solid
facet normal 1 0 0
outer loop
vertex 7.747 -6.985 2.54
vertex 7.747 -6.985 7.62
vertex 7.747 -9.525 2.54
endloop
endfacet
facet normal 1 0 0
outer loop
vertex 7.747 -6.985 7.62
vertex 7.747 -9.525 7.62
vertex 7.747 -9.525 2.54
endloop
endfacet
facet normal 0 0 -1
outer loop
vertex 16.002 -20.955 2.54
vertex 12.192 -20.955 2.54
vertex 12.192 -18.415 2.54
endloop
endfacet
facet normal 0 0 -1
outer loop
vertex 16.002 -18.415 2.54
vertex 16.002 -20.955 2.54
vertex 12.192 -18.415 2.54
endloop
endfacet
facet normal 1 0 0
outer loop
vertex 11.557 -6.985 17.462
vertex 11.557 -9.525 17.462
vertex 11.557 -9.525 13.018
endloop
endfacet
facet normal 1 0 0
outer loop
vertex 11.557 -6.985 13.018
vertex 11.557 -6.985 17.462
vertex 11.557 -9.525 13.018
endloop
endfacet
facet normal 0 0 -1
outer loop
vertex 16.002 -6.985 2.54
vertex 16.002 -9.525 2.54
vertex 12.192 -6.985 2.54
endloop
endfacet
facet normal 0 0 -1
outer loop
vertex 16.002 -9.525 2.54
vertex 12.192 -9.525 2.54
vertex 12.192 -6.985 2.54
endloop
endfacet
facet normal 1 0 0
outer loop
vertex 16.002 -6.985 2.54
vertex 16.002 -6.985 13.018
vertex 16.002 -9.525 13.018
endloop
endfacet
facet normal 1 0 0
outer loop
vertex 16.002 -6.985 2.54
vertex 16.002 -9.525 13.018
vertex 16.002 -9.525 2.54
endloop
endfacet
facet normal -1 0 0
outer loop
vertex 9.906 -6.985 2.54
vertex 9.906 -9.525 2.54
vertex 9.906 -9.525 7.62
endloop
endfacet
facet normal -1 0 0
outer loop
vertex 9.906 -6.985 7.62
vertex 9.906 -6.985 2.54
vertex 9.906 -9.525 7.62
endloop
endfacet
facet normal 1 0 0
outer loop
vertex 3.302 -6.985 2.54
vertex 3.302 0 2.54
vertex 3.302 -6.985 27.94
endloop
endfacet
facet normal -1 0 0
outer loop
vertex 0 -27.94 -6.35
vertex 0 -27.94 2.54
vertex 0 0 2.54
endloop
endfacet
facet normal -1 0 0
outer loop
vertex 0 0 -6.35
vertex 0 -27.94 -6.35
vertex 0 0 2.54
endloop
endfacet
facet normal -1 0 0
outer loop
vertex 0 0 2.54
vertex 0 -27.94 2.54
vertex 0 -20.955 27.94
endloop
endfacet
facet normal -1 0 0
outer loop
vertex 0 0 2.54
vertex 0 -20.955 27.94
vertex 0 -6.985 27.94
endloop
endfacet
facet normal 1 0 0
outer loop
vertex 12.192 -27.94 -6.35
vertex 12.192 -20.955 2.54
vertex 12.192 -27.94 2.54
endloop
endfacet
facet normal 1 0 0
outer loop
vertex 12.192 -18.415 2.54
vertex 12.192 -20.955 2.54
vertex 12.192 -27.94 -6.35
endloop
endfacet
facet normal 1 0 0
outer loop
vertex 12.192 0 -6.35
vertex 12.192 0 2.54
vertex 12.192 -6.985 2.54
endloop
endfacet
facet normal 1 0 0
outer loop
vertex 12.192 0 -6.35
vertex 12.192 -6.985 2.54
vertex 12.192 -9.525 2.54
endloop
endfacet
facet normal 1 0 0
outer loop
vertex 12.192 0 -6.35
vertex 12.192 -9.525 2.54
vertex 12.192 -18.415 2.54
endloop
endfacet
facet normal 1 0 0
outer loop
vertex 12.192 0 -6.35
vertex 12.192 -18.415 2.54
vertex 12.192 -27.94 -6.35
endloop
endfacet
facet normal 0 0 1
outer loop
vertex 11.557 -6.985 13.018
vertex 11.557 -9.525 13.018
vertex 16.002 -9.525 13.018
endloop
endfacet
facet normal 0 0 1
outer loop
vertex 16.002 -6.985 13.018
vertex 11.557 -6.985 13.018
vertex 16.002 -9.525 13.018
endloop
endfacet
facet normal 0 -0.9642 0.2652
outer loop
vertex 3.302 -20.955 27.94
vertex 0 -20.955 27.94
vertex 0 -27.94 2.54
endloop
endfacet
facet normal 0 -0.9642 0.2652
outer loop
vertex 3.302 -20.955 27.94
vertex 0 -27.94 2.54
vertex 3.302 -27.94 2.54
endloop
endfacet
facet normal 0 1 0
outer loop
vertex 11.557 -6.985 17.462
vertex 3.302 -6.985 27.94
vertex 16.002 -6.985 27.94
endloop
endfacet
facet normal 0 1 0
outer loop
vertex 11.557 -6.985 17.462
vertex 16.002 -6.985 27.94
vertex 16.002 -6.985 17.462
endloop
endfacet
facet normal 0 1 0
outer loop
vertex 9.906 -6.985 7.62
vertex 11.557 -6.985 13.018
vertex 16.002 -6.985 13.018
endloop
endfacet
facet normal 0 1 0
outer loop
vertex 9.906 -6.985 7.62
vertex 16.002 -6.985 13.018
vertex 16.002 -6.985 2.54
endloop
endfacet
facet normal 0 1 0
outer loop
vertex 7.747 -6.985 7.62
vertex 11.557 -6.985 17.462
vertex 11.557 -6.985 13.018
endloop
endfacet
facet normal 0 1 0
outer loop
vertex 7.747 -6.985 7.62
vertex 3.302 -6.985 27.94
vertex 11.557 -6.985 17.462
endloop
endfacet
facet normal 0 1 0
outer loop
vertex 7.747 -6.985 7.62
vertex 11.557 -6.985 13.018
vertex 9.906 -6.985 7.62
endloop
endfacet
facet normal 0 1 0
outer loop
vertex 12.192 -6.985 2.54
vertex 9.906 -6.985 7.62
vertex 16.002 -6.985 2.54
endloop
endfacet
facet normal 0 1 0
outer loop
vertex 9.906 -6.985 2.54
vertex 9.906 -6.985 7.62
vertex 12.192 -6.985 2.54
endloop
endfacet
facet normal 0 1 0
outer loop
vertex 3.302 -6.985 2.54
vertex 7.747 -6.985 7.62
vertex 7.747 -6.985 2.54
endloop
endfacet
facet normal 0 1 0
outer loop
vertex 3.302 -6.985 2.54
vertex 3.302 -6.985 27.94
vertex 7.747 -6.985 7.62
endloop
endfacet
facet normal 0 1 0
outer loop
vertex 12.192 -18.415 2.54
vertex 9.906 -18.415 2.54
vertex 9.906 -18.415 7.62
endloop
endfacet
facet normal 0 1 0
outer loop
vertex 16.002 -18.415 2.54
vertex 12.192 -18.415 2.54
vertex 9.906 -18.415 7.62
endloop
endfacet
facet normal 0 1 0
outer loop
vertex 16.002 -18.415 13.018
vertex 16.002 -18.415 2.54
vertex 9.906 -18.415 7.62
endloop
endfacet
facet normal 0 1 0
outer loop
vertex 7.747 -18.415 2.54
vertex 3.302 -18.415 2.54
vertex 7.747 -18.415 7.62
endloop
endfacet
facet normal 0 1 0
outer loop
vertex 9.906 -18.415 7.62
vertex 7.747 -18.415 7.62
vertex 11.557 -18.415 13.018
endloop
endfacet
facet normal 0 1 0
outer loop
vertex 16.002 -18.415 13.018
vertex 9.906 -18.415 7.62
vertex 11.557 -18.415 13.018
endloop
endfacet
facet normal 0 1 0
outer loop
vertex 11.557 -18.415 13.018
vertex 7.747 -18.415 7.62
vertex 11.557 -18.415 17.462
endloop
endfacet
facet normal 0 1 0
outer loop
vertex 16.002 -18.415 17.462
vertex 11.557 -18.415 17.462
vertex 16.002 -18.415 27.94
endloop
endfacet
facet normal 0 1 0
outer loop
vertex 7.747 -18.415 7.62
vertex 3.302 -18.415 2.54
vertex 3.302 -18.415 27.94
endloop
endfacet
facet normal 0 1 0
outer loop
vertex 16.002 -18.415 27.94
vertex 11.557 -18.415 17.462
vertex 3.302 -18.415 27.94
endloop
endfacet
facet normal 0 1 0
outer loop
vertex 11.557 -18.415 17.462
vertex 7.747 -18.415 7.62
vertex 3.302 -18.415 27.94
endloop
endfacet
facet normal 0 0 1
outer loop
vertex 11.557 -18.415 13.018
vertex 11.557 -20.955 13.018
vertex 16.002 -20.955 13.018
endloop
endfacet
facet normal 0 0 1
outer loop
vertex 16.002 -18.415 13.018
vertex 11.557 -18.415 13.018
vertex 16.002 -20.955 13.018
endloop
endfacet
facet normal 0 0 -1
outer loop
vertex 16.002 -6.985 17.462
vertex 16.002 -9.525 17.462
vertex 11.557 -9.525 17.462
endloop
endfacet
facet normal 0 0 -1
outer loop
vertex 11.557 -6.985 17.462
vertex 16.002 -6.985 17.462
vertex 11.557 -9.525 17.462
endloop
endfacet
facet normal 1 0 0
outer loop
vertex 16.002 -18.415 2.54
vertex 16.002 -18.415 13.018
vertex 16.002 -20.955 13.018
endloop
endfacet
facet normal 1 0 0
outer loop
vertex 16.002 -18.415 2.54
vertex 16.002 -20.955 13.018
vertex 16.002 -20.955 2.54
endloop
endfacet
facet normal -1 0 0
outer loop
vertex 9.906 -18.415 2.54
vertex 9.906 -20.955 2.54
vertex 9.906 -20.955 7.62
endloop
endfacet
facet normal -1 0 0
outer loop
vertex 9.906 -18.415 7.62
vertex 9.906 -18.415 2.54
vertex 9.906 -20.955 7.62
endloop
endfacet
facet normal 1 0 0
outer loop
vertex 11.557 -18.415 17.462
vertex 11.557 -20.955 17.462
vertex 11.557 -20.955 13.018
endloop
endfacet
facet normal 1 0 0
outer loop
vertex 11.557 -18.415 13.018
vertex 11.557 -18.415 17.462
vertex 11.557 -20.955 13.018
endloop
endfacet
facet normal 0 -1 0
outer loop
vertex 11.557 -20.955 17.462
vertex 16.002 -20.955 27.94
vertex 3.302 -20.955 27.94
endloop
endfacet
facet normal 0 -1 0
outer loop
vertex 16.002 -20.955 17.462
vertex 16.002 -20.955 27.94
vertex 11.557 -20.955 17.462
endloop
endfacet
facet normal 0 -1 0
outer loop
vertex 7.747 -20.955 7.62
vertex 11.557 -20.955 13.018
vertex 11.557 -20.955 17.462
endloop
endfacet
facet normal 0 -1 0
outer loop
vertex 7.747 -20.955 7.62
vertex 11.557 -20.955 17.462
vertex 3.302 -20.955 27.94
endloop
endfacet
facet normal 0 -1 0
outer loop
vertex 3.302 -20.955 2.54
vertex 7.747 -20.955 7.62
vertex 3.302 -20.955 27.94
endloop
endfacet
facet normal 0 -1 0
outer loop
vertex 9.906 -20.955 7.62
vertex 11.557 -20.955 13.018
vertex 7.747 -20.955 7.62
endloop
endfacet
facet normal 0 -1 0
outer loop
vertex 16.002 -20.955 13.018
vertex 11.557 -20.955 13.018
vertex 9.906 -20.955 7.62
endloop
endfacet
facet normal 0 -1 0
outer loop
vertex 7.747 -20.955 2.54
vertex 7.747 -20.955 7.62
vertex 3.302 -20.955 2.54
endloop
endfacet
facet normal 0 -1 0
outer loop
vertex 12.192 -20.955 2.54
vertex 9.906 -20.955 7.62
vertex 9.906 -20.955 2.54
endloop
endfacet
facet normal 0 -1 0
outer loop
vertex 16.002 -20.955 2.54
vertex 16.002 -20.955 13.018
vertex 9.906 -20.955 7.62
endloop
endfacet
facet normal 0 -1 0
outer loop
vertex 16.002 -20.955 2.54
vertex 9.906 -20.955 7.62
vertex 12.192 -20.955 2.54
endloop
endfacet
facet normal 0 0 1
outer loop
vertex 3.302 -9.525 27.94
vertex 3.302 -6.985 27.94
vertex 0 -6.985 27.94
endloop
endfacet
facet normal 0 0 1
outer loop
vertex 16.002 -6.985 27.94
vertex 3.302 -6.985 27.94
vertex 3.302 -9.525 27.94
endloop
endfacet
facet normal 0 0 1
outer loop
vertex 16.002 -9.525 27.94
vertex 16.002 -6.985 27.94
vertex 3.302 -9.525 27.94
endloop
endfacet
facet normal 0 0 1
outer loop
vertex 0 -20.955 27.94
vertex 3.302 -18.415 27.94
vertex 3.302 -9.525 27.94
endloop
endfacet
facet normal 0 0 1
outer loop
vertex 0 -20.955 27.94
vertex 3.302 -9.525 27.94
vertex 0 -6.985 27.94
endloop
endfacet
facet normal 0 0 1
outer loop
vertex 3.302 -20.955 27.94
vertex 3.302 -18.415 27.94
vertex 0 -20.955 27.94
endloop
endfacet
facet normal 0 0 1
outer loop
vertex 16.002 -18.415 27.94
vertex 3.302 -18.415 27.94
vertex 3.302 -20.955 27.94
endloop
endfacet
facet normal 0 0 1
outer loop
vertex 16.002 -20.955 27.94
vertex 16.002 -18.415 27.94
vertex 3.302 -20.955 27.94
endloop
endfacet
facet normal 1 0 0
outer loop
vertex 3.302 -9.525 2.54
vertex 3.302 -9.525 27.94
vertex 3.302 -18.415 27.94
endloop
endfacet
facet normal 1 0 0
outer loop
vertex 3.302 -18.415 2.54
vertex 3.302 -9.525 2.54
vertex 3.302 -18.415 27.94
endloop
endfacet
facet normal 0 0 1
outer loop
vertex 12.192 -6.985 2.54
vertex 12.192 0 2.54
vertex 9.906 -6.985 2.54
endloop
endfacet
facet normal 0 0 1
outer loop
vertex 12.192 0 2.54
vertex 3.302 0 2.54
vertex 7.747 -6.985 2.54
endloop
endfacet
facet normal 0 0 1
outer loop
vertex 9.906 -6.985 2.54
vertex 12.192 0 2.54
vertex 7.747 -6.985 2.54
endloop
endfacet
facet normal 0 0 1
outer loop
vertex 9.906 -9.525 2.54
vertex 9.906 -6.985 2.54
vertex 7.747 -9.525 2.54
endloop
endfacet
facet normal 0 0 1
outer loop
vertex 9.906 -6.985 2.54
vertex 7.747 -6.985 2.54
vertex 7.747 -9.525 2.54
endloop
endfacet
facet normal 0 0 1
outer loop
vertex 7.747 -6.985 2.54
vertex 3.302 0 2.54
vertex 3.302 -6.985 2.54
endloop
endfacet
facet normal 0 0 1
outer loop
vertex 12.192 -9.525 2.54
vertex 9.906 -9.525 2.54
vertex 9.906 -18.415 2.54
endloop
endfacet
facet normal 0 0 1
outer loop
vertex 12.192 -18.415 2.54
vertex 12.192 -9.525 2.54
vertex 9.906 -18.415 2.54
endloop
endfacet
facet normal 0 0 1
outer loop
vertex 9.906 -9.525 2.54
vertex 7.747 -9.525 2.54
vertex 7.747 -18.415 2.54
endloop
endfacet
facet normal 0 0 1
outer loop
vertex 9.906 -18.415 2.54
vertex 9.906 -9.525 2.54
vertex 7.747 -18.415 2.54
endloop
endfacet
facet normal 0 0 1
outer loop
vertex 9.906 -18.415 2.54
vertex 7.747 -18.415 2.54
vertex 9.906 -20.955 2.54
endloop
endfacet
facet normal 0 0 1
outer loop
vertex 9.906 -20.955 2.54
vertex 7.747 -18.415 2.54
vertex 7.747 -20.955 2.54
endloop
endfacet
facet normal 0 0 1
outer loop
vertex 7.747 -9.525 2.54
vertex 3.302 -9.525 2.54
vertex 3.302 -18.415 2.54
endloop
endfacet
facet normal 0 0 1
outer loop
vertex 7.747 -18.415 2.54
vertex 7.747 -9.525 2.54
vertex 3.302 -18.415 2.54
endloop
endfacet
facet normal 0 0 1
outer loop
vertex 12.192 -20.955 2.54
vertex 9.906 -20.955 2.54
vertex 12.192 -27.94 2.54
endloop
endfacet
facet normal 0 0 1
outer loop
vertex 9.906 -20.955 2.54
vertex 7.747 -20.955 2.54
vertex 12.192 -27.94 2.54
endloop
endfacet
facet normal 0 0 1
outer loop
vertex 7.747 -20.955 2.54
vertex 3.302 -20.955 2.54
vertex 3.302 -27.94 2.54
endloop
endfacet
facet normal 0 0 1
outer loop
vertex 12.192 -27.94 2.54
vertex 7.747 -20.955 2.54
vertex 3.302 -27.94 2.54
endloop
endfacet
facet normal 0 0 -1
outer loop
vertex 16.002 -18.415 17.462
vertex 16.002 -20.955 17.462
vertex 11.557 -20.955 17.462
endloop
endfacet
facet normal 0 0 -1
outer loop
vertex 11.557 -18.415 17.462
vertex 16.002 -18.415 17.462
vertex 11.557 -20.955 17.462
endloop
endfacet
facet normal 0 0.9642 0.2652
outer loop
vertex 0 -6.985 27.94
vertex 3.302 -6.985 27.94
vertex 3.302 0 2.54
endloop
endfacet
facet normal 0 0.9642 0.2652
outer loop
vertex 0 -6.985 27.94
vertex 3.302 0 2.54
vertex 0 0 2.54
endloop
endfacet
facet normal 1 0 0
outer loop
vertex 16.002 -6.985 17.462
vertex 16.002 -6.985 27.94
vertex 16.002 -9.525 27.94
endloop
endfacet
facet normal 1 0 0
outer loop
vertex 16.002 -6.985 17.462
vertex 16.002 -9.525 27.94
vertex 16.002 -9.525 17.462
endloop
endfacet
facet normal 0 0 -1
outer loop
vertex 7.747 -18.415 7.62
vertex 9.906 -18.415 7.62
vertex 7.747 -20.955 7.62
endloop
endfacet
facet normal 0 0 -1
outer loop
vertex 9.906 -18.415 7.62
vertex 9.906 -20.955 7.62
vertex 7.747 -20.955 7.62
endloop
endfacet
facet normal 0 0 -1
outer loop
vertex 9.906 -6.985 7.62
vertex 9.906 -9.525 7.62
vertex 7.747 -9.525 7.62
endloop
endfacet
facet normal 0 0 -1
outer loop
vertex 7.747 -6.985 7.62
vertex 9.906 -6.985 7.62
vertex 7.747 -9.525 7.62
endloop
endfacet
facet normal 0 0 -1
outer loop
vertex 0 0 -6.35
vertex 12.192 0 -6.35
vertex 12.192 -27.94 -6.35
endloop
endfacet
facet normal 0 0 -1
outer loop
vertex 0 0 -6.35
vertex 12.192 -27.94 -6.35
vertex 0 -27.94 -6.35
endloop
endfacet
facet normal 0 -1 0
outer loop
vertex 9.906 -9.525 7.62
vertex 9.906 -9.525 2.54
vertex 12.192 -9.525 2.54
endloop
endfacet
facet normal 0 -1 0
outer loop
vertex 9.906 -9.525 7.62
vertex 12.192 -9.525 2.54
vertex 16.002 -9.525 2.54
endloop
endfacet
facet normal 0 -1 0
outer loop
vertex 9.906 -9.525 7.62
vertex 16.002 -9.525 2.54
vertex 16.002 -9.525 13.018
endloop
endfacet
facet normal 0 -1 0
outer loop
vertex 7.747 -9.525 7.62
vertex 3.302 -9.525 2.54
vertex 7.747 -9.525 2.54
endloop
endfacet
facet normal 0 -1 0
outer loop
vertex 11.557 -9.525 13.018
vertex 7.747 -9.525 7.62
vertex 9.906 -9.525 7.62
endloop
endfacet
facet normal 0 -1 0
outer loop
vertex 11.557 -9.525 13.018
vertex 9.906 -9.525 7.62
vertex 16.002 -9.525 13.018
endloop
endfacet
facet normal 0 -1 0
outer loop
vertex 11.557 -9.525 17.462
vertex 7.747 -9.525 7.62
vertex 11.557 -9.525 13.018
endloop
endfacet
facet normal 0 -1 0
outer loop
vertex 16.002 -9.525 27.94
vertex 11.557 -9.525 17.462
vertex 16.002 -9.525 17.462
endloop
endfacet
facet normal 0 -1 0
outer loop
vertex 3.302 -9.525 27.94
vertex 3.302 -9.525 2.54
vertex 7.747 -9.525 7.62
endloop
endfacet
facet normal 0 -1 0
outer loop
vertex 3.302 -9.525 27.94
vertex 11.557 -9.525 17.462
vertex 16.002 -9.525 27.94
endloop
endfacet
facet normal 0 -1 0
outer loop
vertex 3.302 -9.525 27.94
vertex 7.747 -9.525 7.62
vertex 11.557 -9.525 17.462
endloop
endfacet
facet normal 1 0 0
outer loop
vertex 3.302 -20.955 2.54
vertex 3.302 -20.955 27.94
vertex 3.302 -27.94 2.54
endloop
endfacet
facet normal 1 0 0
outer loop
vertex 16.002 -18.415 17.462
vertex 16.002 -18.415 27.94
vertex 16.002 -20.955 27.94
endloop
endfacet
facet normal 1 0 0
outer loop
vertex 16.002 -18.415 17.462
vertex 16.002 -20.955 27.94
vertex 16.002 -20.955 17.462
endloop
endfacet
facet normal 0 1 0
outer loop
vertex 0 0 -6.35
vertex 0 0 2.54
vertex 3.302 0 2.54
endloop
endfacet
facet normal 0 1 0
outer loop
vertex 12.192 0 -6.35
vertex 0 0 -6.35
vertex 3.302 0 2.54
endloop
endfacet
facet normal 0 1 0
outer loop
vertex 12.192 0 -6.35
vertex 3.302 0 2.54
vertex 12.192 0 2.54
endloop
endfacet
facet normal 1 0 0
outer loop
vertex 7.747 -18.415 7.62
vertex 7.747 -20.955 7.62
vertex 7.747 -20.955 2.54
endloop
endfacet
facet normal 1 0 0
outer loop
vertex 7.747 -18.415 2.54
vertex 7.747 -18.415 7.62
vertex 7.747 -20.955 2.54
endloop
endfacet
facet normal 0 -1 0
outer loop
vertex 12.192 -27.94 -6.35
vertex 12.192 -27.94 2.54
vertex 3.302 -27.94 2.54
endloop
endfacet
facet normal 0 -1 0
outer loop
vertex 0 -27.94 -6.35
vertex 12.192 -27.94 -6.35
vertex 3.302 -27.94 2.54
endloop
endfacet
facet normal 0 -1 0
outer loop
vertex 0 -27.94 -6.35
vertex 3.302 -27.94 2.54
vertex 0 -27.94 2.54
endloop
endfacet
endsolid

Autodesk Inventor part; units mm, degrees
ref_plane "YZ Plane" through (0, 0, 0) normal (1, 0, 0) x (0, 1, 0)
ref_plane "XZ Plane" through (0, 0, 0) normal (0, 1, 0) x (-1, 0, 0)
sketch "Sketch1" plane through (0, 0, 0) normal (0, 0, 1) x (1, 0, 0)
  line L0 (0, 0) -> (3.302, 0)
  line L1 (3.302, 0) -> (3.302, -27.94)
  line L2 (3.302, -27.94) -> (0, -27.94)
  line L3 (0, -27.94) -> (0, 0)
  dimension "d0" = 3.302
  dimension "d1" = 27.94
extrude "Extrusion1" add sketch "Sketch1" along normal blind 2.54
sketch "Sketch2" plane through (0, 0, 2.54) normal (0, 0, 1) x (1, 0, 0)
  line L0 (3.302, 0) -> (0, 0) projected
  line L1 (0, 0) -> (0, -27.94) projected
  line L2 (0, -27.94) -> (3.302, -27.94) projected
  line L3 (3.302, -27.94) -> (3.302, 0) projected
ref_plane "Work Plane1" through (0, 0, 27.94) normal (0, 0, 1) x (1, 0, 0)
sketch "Sketch3" plane through (0, 0, 27.94) normal (0, 0, 1) x (1, 0, 0)
  line L0 (0, -6.985) -> (3.302, -6.985)
  line L1 (3.302, -6.985) -> (3.302, -20.955)
  line L2 (3.302, -20.955) -> (0, -20.955)
  line L3 (0, -20.955) -> (0, -6.985)
  line L4 (0, -27.94) -> (3.302, -27.94) projected
  line L5 (0, 0) -> (0, -27.94) projected
  dimension "d5" = 3.302
  dimension "d6" = 13.97
  dimension "d7" = 6.985
  dimension "d8" = 0
loft "Loft1" add profiles "Sketch2", "Sketch3"
sketch "Sketch4" plane through (3.302, -27.94, 0) normal (1, 0, 0) x (0, 0, -1)
  line L0 (0, 0) -> (0, 27.94) projected
  line L1 (-2.54, 0) -> (-27.94, 6.985) projected
  line L2 (0, 27.94) -> (-2.54, 27.94)
  line L3 (-2.54, 27.94) -> (-2.54, 0)
  line L4 (-2.54, 0) -> (0, 0)
  line L5 (0, 0) -> (0, 27.94)
  line L6 (-2.54, 27.94) -> (-27.94, 20.955) projected
  line L7 (-27.94, 20.955) -> (-2.54, 20.955)
  line L8 (-2.54, 20.955) -> (-2.54, 18.415)
  line L9 (-2.54, 18.415) -> (-27.94, 18.415)
  line L10 (-27.94, 18.415) -> (-27.94, 20.955)
  line L11 (-27.94, 6.985) -> (-2.54, 6.985)
  line L12 (-2.54, 6.985) -> (-2.54, 9.525)
  line L13 (-2.54, 9.525) -> (-27.94, 9.525)
  line L14 (-27.94, 9.525) -> (-27.94, 6.985)
  dimension "d13" = 2.54
  dimension "d14" = 2.54
extrude "Extrusion2" add sketch "Sketch4" along normal blind 8.89 contours L4 L3 L2 L0 | L1 L11 L3 | L14 L13 L3 L11 | L3 L9 L10 L7
sketch "Sketch5" plane through (12.192, -27.94, 0) normal (1, 0, 0) x (0, 0, -1)
  line L0 (-27.94, 20.955) -> (-27.94, 6.985) projected
  line L1 (-27.94, 6.985) -> (-2.54, 6.985)
  line L2 (0, 0) -> (-2.54, 0) projected
  line L3 (-2.54, 0) -> (-2.54, 6.985)
  line L4 (-2.54, 0) -> (-27.94, 6.985) projected
  line L5 (-2.54, 0) -> (-27.94, 6.985)
  point P0 (0, 27.94)
extrude "Extrusion3" cut sketch "Sketch5" against normal blind 8.89
sketch "Sketch6" plane through (12.192, -20.955, 2.54) normal (0, -1, 0) x (1, 0, 0)
  line L0 (-2.286, 5.08) -> (-4.445, 5.08)
  line L1 (-4.445, 5.08) -> (-4.445, 0)
  line L2 (-4.445, 0) -> (-2.286, 0)
  line L3 (-2.286, 0) -> (-2.286, 5.08)
  line L4 (-8.89, 0) -> (0, 0) projected
  line L5 (0, 25.4) -> (0, 0) projected
  point P0 (-12.192, -2.54)
  dimension "d19" = 0
  dimension "d20" = 5.08
  dimension "d21" = 2.286
  dimension "d22" = 2.159
extrude "Extrusion4" cut sketch "Sketch6" against normal blind 25.4
sketch "Sketch7" plane through (12.192, -20.955, 2.54) normal (0, -1, 0) x (1, 0, 0)
  line L0 (0, 14.9225) -> (-0.635, 14.9225)
  line L1 (-0.635, 14.9225) -> (-0.635, 10.4775)
  line L2 (-0.635, 10.4775) -> (0, 10.4775)
  line L3 (0, 10.4775) -> (0, 14.9225)
  line L4 (0, 25.4) -> (0, 0) projected
  line L5 (-8.89, 25.4) -> (0, 25.4) projected
  point P0 (-12.192, -2.54)
  dimension "d25" = 0.635
  dimension "d26" = 4.445
  dimension "d27" = 0
  dimension "d28" = 10.4775
extrude "Extrusion5" cut sketch "Sketch7" against normal blind 25.4
sketch "Sketch8" plane through (12.192, -27.94, 0) normal (1, 0, 0) x (0, 0, -1)
  line L0 (-2.54, 18.415) -> (-2.54, 20.955) projected
  line L1 (-13.0175, 20.955) -> (-13.0175, 18.415) projected
  line L2 (-2.54, 20.955) -> (-13.0175, 20.955)
  line L3 (-13.0175, 20.955) -> (-13.0175, 18.415)
  line L4 (-13.0175, 18.415) -> (-2.54, 18.415)
  line L5 (-2.54, 18.415) -> (-2.54, 20.955)
  line L6 (-2.54, 9.525) -> (-13.0175, 9.525) projected
  line L7 (-27.94, 6.985) -> (-2.54, 6.985) projected
  line L8 (-2.54, 9.525) -> (-13.0175, 9.525)
  line L9 (-13.0175, 9.525) -> (-13.0175, 6.985)
  line L10 (-13.0175, 6.985) -> (-2.54, 6.985)
  line L11 (-2.54, 6.985) -> (-2.54, 9.525)
  line L12 (-17.4625, 20.955) -> (-13.0175, 20.955) projected
  line L13 (-27.94, 9.525) -> (-27.94, 18.415) projected
  line L14 (-17.4625, 20.955) -> (-27.94, 20.955)
  line L15 (-27.94, 20.955) -> (-27.94, 18.415)
  line L16 (-27.94, 18.415) -> (-17.4625, 18.415)
  line L17 (-17.4625, 18.415) -> (-17.4625, 20.955)
  line L18 (-17.4625, 6.985) -> (-17.4625, 9.525) projected
  line L19 (-17.4625, 9.525) -> (-27.94, 9.525)
  line L20 (-27.94, 9.525) -> (-27.94, 6.985)
  line L21 (-27.94, 6.985) -> (-17.4625, 6.985)
  line L22 (-17.4625, 6.985) -> (-17.4625, 9.525)
  point P0 (0, 27.94)
extrude "Extrusion6" add sketch "Sketch8" along normal blind 3.81
sketch "Sketch9" plane through (0, 0, 0) normal (0, 0, -1) x (-1, 0, 0)
  point P0 (0, 0)
sketch "Sketch10" plane through (0, 0, 0) normal (0, 0, -1) x (-1, 0, 0)
  line L0 (-12.192, -27.94) -> (0, -27.94) projected
  line L1 (0, -27.94) -> (0, 0) projected
  line L2 (-12.192, -27.94) -> (0, -27.94)
  line L3 (0, -27.94) -> (0, 0)
  line L4 (0, 0) -> (-12.192, 0)
  line L5 (-12.192, 0) -> (-12.192, -27.94)
extrude "Extrusion7" add sketch "Sketch10" along normal blind 6.35
sketch "Sketch13" plane through (12.192, -27.94, 0) normal (1, 0, 0) x (0, 0, -1)
  point P0 (0, 27.94)
sketch "Sketch14" plane through (12.192, -27.94, 0) normal (1, 0, 0) x (0, 0, -1)
  point P0 (0, 27.94)
sketch "Sketch15" plane through (12.192, -27.94, 0) normal (1, 0, 0) x (0, 0, -1)
  circle A0 centre (1.905, 13.97) radius 2.54
  line L0 (6.35, 27.94) -> (6.35, 0) projected
  line L1 (-2.54, 27.94) -> (6.35, 27.94) projected
  point P0 (0, 27.94)
  dimension "d41" = 5.08
  dimension "d42" = 4.445
  dimension "d43" = 13.97
extrude "Extrusion9" cut sketch "Sketch15" against normal blind 254
sketch "Sketch17" plane through (12.192, -27.94, 0) normal (1, 0, 0) x (0, 0, -1)
  circle A0 centre (1.905, 13.97) radius 2.54 projected
  circle A1 centre (1.905, 13.97) radius 2.54
  point P0 (0, 27.94)
extrude "Extrusion10" add sketch "Sketch17" against normal blind 12.192
properties part number "Talon for encoder"
